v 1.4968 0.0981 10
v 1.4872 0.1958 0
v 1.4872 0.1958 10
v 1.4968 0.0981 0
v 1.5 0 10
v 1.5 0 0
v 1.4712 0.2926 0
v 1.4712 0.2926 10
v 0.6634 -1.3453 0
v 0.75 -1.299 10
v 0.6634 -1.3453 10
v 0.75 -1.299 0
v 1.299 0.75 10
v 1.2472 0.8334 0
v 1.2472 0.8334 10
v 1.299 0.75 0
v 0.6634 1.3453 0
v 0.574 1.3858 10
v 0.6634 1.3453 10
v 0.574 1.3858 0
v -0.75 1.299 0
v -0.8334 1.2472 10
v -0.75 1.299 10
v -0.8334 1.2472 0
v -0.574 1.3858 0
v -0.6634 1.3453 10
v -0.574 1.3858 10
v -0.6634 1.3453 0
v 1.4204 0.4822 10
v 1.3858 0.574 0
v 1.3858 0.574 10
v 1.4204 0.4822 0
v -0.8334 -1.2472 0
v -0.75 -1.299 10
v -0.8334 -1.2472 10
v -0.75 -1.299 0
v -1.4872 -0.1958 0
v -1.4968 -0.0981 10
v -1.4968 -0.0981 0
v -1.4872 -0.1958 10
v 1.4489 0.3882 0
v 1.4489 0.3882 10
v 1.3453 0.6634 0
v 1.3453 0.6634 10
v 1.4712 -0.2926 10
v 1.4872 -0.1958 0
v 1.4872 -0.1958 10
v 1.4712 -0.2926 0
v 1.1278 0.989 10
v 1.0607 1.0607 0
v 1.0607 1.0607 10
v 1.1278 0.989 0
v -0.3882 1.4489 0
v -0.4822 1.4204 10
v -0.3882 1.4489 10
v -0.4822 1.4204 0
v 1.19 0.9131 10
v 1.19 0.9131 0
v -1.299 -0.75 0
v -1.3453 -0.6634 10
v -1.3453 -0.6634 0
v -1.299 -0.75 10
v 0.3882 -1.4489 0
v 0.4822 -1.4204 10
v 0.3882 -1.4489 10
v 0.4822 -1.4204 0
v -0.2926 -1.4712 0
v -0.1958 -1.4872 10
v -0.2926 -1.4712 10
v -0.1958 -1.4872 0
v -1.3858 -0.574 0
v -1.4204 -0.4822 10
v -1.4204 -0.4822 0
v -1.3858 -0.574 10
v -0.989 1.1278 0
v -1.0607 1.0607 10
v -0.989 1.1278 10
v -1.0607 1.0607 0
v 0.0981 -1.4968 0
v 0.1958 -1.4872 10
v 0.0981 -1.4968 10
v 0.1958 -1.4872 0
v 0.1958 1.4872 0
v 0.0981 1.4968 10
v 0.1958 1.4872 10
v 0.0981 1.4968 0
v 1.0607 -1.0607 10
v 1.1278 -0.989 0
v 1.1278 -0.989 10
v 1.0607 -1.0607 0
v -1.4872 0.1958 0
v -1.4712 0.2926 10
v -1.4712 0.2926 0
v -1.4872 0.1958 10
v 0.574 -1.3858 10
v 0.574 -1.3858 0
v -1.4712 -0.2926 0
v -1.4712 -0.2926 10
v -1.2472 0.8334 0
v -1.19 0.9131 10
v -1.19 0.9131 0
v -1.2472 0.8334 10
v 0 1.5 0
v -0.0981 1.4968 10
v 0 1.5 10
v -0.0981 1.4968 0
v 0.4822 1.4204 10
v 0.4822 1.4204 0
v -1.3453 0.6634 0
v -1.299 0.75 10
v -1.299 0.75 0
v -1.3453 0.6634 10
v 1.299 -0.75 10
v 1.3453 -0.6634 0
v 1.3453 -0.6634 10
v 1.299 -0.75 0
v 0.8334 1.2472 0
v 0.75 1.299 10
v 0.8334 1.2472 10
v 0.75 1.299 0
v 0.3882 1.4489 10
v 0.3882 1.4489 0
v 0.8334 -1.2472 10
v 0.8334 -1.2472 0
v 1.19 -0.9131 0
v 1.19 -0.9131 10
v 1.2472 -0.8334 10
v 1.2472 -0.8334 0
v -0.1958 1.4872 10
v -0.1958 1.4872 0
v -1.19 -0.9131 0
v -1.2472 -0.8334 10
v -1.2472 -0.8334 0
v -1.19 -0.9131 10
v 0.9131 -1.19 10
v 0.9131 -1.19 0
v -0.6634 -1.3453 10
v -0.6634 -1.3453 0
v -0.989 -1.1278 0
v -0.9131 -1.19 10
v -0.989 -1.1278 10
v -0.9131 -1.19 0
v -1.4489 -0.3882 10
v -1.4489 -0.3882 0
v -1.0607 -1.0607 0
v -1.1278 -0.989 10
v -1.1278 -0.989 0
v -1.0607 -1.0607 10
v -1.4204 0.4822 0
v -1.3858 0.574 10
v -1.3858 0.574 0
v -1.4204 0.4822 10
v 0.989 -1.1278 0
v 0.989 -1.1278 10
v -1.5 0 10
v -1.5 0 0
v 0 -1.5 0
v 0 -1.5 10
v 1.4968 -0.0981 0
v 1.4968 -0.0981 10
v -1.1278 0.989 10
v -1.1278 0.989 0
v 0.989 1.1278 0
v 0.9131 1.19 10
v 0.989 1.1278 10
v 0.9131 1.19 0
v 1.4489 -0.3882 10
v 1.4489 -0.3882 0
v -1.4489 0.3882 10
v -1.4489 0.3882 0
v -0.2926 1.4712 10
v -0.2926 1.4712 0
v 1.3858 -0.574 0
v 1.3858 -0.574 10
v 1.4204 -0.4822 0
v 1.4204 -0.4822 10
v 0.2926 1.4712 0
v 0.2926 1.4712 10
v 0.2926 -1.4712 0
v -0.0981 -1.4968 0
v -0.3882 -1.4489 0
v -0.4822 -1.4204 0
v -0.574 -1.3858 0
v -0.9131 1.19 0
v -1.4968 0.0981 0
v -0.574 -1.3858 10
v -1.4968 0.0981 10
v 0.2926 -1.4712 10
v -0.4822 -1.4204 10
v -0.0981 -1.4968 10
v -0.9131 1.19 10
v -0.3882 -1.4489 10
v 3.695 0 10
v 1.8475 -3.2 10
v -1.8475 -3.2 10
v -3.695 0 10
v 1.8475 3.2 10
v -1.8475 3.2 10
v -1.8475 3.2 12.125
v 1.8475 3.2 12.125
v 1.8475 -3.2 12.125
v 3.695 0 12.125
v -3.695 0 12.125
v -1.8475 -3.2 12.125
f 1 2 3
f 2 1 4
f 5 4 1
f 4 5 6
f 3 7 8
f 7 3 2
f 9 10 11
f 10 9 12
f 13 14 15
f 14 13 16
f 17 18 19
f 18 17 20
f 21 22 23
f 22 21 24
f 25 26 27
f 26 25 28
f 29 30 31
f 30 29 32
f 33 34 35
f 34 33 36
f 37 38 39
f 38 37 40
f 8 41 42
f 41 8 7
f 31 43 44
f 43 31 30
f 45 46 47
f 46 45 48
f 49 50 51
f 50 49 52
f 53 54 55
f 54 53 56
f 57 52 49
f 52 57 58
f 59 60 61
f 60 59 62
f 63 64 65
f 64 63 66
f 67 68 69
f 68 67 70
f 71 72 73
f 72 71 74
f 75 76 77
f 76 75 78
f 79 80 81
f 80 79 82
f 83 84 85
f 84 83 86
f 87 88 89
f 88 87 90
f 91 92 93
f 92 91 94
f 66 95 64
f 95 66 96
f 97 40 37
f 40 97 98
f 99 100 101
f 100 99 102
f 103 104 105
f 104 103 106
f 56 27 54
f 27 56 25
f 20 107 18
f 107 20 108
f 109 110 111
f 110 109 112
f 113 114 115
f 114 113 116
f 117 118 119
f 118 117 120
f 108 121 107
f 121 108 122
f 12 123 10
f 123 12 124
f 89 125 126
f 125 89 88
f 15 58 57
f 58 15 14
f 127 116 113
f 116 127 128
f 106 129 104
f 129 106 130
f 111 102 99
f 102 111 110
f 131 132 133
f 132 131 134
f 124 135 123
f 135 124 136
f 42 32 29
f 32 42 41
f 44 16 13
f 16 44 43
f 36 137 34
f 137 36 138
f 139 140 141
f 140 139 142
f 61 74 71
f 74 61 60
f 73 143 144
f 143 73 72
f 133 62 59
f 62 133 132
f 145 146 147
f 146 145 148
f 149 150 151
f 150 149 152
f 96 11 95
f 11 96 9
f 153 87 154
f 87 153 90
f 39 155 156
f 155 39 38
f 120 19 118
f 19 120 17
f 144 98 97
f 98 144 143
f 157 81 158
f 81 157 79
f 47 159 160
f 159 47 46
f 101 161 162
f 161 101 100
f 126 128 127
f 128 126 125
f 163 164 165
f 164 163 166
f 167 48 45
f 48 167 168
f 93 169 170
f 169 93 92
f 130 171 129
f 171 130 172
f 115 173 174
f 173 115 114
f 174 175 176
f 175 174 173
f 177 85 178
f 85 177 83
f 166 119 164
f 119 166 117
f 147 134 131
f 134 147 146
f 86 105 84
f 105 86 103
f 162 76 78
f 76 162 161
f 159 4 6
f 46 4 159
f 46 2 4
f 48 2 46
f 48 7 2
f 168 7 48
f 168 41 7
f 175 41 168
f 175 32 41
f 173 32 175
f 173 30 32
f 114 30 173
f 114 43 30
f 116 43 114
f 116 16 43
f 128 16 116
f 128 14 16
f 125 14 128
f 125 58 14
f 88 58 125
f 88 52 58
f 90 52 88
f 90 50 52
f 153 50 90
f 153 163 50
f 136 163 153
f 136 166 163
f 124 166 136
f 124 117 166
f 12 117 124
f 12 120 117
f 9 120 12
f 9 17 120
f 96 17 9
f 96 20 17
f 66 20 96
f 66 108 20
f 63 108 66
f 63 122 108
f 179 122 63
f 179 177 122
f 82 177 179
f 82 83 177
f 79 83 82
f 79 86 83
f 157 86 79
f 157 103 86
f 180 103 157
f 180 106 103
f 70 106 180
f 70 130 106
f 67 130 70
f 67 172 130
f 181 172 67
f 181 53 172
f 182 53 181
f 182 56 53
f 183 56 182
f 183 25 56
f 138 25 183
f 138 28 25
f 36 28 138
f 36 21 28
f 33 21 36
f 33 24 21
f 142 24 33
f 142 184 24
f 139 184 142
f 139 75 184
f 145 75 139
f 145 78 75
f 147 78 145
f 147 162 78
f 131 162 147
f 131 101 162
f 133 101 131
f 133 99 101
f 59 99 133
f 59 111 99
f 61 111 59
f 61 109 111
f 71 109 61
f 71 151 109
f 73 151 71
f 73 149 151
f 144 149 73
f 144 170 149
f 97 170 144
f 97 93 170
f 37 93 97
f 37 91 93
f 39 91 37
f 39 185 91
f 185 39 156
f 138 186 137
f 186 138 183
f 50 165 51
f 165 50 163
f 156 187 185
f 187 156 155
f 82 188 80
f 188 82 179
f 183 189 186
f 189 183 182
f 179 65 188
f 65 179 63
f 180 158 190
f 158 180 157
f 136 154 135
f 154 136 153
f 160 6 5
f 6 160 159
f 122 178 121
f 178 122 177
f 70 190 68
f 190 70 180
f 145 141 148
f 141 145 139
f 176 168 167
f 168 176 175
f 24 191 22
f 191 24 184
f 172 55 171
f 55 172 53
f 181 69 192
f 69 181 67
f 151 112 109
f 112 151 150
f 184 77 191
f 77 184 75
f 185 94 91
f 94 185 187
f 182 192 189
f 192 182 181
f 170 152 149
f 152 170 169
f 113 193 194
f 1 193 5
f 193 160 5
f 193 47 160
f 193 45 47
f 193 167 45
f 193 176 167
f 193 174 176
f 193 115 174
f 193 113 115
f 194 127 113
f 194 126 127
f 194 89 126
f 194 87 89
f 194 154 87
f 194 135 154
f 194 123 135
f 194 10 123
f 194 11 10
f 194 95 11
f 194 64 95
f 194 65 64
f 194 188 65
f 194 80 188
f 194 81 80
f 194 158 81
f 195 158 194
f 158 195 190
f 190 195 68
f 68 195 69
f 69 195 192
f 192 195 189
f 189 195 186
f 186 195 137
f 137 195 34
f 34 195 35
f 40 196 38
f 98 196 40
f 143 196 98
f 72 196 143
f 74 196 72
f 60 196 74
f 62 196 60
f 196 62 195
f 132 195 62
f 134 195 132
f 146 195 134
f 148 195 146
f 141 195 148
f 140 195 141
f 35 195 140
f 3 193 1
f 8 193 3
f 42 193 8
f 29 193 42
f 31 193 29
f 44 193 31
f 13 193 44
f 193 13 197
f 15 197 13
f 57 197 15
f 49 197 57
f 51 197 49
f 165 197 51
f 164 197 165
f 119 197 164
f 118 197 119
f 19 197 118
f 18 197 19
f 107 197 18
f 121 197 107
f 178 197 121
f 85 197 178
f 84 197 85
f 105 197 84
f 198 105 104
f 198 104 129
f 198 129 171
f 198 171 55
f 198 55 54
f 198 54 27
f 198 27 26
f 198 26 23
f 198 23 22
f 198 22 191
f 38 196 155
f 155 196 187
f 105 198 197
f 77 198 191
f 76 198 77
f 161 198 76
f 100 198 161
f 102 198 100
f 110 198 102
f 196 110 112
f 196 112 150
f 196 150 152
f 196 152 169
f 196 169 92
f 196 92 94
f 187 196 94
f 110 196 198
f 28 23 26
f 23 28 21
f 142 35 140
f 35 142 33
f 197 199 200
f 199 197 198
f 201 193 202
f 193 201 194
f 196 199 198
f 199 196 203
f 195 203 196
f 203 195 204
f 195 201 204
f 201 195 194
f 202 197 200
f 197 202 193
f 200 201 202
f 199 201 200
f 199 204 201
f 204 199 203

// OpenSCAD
$fn = 96;

shaft_d = 3.0;
length = 10.0;

head_flat_d = 6.4;      // across flats
head_h = 2.125;

module hex_prism(af, h) {
    // Regular hexagon: across-flats = 2*apothem = af
    // Circumradius R = af / sqrt(3)
    R = af / sqrt(3);
    linear_extrude(height = h)
        polygon(points = [for (i = [0:5]) [R*cos(60*i), R*sin(60*i)]]);
}

union() {
    // Shaft
    cylinder(d = shaft_d, h = length);

    // Hex head on top
    translate([0,0,length])
        hex_prism(head_flat_d, head_h);
}
